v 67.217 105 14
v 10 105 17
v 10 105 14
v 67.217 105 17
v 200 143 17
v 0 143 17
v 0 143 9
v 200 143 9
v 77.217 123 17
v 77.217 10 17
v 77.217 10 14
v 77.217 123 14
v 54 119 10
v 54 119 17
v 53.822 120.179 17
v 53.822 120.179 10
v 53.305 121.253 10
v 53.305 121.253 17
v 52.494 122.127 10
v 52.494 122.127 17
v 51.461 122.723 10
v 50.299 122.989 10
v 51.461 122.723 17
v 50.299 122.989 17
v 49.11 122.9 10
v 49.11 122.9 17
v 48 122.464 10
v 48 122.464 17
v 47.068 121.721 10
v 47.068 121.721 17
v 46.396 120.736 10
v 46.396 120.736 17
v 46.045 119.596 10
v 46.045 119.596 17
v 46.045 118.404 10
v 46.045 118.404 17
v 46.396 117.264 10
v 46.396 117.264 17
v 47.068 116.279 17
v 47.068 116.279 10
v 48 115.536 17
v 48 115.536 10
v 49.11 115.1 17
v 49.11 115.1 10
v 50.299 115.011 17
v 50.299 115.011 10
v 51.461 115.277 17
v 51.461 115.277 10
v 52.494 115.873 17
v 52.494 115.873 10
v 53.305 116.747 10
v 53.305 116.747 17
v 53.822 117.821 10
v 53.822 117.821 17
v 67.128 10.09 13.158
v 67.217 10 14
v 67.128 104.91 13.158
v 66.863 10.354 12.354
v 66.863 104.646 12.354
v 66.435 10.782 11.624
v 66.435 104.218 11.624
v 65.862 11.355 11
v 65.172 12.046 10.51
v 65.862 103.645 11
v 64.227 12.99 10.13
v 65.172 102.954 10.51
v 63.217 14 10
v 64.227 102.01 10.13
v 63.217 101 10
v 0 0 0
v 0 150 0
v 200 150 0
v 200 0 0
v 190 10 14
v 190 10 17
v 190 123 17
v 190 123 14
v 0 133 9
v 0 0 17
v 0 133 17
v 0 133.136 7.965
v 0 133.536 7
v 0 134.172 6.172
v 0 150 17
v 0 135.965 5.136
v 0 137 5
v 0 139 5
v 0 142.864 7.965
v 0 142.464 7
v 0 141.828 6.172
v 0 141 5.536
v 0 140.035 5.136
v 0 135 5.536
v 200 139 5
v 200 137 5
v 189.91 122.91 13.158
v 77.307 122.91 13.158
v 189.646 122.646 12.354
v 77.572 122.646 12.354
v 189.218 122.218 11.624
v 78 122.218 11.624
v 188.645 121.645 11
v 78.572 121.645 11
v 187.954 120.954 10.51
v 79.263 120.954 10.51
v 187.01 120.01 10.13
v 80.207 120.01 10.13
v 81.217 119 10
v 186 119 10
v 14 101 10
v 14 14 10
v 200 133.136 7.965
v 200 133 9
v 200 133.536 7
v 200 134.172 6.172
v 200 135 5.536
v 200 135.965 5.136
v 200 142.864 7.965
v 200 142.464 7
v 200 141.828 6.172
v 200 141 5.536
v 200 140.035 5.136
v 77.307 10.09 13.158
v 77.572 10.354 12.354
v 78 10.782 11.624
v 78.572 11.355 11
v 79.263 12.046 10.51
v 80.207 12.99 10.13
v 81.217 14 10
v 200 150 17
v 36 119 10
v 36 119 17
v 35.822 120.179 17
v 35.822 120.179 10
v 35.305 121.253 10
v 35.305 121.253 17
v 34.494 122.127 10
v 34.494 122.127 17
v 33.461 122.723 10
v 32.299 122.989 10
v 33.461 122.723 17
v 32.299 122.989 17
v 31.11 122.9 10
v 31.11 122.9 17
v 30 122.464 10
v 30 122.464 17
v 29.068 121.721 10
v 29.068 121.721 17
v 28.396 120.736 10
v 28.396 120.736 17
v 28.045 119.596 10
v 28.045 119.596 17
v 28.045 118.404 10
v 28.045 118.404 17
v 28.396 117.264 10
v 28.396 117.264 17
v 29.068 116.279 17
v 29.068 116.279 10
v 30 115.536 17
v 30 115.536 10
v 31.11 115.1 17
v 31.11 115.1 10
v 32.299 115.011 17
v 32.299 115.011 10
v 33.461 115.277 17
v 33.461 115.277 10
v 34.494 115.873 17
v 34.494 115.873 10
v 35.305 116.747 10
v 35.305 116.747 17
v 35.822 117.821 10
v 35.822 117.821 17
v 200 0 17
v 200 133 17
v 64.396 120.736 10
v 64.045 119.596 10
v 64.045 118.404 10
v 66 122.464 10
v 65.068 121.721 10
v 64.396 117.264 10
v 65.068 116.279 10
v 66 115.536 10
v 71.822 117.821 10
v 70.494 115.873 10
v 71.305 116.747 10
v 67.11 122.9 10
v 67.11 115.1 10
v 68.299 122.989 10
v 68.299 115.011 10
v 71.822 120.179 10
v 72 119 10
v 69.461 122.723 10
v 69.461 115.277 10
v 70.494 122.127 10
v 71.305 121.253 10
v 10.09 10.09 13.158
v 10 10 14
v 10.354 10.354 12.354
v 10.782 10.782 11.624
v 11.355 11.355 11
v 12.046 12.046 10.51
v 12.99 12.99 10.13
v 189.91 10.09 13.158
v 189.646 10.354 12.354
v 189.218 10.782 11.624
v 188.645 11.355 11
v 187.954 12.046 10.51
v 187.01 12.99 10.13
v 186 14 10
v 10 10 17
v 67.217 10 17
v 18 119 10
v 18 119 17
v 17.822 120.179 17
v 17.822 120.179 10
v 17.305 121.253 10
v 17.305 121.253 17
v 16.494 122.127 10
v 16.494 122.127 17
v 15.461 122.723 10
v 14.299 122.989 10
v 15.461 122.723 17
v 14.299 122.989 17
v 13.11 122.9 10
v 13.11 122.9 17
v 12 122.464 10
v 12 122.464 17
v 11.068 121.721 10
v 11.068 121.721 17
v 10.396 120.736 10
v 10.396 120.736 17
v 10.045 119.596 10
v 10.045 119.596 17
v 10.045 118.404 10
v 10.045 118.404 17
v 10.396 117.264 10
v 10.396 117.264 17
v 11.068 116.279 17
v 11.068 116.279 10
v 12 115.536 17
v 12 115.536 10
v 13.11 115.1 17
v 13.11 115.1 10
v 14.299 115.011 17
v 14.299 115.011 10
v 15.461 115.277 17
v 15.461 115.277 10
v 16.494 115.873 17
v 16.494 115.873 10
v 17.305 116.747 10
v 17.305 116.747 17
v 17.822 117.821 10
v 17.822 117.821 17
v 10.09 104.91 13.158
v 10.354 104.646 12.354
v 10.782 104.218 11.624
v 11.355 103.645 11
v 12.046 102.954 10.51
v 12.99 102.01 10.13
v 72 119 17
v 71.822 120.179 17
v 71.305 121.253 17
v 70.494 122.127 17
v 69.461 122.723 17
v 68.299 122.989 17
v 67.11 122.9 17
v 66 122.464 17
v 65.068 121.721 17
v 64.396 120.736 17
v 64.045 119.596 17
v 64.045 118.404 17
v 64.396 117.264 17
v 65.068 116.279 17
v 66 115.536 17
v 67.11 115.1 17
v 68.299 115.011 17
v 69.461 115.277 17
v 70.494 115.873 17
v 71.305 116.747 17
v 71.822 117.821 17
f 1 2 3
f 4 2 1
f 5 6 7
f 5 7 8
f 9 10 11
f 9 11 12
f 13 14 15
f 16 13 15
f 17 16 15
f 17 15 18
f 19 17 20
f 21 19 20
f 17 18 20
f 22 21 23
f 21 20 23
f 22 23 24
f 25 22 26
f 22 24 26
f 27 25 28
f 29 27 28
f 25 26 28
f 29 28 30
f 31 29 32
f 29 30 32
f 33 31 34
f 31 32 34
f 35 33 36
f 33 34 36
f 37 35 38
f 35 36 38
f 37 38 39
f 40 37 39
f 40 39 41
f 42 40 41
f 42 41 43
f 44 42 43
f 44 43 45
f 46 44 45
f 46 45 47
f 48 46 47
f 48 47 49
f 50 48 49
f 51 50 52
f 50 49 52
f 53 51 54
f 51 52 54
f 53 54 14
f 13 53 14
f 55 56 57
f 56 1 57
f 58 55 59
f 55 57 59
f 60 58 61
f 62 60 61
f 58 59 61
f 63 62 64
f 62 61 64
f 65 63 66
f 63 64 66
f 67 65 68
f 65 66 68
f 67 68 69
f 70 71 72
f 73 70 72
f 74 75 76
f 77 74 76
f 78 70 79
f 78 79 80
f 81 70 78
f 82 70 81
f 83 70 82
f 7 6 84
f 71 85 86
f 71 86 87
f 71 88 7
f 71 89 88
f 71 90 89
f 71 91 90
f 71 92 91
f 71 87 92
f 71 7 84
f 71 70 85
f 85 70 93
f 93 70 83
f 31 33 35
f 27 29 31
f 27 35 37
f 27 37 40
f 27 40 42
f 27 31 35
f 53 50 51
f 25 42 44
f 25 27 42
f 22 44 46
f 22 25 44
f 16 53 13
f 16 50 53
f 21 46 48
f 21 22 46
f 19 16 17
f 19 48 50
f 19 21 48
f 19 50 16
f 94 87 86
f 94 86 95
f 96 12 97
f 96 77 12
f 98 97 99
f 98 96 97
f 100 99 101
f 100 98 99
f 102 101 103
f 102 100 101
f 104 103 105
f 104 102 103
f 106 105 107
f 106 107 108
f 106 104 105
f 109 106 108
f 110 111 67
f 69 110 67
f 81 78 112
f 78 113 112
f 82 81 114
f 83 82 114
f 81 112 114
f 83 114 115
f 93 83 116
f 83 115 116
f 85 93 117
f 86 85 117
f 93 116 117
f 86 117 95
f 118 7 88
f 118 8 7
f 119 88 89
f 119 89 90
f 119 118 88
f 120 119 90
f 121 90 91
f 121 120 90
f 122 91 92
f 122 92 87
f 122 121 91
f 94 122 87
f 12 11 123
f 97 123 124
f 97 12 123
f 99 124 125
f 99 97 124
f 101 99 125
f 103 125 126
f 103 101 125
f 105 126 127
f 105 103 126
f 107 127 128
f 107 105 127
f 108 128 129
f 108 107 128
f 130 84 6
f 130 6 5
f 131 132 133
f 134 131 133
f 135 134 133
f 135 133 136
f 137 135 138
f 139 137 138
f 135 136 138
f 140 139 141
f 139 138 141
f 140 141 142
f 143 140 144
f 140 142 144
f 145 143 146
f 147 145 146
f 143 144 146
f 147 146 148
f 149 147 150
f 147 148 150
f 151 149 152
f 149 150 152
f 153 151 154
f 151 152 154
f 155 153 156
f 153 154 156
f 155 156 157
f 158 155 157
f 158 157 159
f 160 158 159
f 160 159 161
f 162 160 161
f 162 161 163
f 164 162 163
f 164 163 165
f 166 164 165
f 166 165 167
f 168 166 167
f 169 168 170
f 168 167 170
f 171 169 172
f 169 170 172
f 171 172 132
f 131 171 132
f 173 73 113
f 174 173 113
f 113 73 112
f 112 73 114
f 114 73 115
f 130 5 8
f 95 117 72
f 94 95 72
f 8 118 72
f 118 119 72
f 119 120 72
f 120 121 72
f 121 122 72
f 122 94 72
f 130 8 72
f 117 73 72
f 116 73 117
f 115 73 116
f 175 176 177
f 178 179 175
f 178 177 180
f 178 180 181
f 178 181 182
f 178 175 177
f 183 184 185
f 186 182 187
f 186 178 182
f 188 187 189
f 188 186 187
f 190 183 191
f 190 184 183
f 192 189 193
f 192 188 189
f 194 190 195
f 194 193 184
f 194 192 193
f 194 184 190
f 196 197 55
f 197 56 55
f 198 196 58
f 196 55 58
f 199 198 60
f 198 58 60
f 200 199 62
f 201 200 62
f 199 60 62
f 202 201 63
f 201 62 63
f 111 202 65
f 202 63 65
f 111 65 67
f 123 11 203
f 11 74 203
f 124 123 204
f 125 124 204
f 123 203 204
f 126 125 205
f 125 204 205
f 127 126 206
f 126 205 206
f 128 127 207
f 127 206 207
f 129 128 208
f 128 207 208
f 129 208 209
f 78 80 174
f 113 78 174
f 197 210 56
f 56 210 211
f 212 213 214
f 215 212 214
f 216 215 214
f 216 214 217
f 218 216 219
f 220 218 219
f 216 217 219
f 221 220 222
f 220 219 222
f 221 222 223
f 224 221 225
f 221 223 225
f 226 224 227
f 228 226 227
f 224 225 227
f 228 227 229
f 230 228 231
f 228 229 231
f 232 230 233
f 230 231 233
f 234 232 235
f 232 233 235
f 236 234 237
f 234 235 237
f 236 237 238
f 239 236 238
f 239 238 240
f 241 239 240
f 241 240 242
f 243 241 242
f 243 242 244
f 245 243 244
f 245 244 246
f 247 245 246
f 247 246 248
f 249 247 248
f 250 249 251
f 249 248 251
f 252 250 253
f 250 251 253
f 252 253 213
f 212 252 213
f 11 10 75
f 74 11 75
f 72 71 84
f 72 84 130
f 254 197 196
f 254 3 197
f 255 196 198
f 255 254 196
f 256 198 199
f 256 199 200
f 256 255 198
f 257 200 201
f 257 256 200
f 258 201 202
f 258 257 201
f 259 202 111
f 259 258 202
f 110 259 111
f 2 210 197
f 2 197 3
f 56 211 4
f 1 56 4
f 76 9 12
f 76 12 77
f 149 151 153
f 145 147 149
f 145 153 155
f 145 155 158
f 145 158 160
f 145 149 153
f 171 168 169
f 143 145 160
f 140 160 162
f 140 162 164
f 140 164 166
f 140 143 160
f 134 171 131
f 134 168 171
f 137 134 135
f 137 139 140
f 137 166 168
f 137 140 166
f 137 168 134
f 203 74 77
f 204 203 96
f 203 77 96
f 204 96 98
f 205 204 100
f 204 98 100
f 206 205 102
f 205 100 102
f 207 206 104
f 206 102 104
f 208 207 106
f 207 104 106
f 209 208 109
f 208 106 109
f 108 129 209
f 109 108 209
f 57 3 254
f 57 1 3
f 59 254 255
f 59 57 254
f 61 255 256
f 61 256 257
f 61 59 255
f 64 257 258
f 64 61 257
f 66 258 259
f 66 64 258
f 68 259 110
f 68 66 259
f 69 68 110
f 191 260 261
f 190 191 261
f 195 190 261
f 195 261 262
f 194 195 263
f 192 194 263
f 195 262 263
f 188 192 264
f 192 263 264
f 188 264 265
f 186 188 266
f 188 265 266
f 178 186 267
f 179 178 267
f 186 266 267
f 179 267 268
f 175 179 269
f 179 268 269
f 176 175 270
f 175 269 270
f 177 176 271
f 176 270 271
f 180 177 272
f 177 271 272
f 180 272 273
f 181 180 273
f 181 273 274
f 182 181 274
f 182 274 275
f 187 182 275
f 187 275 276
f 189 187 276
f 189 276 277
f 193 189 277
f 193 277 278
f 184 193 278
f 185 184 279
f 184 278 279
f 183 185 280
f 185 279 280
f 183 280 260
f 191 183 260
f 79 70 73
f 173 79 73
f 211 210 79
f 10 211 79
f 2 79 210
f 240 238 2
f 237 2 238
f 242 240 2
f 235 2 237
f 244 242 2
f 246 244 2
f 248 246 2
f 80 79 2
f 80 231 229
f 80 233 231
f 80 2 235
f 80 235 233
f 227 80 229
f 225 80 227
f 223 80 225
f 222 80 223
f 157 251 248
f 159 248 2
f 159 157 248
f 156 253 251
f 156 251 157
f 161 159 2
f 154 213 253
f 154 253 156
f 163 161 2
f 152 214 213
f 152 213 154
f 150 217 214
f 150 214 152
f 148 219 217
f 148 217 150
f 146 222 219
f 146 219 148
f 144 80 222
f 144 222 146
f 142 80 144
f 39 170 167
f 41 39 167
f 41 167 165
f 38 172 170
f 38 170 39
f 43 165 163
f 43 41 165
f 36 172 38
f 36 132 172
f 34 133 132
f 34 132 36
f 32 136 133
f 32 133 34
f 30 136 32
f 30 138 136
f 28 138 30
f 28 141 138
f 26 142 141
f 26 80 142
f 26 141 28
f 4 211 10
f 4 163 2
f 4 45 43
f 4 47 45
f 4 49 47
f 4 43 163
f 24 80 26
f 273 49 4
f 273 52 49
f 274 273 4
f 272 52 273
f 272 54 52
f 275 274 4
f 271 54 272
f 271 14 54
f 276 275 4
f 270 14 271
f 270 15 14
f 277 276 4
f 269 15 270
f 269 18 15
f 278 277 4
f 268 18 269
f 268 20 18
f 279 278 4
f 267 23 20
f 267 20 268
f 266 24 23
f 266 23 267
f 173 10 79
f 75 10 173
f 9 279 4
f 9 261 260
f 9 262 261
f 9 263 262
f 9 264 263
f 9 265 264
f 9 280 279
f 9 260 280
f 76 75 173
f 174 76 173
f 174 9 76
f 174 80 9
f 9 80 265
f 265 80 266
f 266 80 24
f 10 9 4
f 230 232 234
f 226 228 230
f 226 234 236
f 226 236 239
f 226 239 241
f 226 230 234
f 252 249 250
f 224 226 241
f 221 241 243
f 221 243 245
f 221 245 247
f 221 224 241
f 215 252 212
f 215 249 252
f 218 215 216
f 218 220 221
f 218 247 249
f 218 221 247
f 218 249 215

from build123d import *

# Parameters (mm, degrees)
F0_W     = 200
F0_H     = 150
F1_DEPTH = 17
F2_W     = 200
F2_H     = 10
F3_DEPTH = 12
F2_R     = 4
F2_W_2   = 57.217171
F2_H_2   = 95
F2_W_3   = 112.782829
F2_H_3   = 113
F4_DEPTH = 7
F5_R     = 4
F6_R     = 4
F7_R     = 4


with BuildPart() as f1:
    # F0 (on Top) → F1 (new body)
    with BuildSketch(Plane.XY):
        with Locations((100, 75)):
            Rectangle(F0_W, F0_H)
    extrude(amount=F1_DEPTH)

    # F2 (on face) → F3 (cut)
    with BuildSketch(Plane.XY.offset(17)):
        with Locations((100, 138)):
            Rectangle(F2_W, F2_H)
    extrude(amount=-F3_DEPTH, mode=Mode.SUBTRACT)

    # F2 (on face) → F4 (cut)
    with BuildSketch(Plane.XY.offset(17)):
        with Locations((14, 119)):
            Circle(F2_R)
        with Locations((32, 119)):
            Circle(F2_R)
        with Locations((50, 119)):
            Circle(F2_R)
        with Locations((68, 119)):
            Circle(F2_R)
        with Locations((38.608585, 57.5)):
            Rectangle(F2_W_2, F2_H_2)
        with Locations((133.608586, 66.5)):
            Rectangle(F2_W_3, F2_H_3)
    extrude(amount=-F4_DEPTH, mode=Mode.SUBTRACT)

    # F5
    f5_edges = [f1.edges().sort_by_distance(p)[0] for p in [
        (133.608586, 123, 10),
        (77.217171, 66.5, 10),
        (133.608586, 10, 10),
        (190, 66.5, 10),
    ]]
    fillet(f5_edges, radius=F5_R)

    # F6
    f6_edges = [f1.edges().sort_by_distance(p)[0] for p in [
        (100, 143, 5),
        (100, 133, 5),
    ]]
    fillet(f6_edges, radius=F6_R)

    # F7
    f7_edges = [f1.edges().sort_by_distance(p)[0] for p in [
        (10, 57.5, 10),
        (38.608586, 105, 10),
        (67.217171, 57.5, 10),
        (38.608586, 10, 10),
    ]]
    fillet(f7_edges, radius=F7_R)


solid = f1.part
